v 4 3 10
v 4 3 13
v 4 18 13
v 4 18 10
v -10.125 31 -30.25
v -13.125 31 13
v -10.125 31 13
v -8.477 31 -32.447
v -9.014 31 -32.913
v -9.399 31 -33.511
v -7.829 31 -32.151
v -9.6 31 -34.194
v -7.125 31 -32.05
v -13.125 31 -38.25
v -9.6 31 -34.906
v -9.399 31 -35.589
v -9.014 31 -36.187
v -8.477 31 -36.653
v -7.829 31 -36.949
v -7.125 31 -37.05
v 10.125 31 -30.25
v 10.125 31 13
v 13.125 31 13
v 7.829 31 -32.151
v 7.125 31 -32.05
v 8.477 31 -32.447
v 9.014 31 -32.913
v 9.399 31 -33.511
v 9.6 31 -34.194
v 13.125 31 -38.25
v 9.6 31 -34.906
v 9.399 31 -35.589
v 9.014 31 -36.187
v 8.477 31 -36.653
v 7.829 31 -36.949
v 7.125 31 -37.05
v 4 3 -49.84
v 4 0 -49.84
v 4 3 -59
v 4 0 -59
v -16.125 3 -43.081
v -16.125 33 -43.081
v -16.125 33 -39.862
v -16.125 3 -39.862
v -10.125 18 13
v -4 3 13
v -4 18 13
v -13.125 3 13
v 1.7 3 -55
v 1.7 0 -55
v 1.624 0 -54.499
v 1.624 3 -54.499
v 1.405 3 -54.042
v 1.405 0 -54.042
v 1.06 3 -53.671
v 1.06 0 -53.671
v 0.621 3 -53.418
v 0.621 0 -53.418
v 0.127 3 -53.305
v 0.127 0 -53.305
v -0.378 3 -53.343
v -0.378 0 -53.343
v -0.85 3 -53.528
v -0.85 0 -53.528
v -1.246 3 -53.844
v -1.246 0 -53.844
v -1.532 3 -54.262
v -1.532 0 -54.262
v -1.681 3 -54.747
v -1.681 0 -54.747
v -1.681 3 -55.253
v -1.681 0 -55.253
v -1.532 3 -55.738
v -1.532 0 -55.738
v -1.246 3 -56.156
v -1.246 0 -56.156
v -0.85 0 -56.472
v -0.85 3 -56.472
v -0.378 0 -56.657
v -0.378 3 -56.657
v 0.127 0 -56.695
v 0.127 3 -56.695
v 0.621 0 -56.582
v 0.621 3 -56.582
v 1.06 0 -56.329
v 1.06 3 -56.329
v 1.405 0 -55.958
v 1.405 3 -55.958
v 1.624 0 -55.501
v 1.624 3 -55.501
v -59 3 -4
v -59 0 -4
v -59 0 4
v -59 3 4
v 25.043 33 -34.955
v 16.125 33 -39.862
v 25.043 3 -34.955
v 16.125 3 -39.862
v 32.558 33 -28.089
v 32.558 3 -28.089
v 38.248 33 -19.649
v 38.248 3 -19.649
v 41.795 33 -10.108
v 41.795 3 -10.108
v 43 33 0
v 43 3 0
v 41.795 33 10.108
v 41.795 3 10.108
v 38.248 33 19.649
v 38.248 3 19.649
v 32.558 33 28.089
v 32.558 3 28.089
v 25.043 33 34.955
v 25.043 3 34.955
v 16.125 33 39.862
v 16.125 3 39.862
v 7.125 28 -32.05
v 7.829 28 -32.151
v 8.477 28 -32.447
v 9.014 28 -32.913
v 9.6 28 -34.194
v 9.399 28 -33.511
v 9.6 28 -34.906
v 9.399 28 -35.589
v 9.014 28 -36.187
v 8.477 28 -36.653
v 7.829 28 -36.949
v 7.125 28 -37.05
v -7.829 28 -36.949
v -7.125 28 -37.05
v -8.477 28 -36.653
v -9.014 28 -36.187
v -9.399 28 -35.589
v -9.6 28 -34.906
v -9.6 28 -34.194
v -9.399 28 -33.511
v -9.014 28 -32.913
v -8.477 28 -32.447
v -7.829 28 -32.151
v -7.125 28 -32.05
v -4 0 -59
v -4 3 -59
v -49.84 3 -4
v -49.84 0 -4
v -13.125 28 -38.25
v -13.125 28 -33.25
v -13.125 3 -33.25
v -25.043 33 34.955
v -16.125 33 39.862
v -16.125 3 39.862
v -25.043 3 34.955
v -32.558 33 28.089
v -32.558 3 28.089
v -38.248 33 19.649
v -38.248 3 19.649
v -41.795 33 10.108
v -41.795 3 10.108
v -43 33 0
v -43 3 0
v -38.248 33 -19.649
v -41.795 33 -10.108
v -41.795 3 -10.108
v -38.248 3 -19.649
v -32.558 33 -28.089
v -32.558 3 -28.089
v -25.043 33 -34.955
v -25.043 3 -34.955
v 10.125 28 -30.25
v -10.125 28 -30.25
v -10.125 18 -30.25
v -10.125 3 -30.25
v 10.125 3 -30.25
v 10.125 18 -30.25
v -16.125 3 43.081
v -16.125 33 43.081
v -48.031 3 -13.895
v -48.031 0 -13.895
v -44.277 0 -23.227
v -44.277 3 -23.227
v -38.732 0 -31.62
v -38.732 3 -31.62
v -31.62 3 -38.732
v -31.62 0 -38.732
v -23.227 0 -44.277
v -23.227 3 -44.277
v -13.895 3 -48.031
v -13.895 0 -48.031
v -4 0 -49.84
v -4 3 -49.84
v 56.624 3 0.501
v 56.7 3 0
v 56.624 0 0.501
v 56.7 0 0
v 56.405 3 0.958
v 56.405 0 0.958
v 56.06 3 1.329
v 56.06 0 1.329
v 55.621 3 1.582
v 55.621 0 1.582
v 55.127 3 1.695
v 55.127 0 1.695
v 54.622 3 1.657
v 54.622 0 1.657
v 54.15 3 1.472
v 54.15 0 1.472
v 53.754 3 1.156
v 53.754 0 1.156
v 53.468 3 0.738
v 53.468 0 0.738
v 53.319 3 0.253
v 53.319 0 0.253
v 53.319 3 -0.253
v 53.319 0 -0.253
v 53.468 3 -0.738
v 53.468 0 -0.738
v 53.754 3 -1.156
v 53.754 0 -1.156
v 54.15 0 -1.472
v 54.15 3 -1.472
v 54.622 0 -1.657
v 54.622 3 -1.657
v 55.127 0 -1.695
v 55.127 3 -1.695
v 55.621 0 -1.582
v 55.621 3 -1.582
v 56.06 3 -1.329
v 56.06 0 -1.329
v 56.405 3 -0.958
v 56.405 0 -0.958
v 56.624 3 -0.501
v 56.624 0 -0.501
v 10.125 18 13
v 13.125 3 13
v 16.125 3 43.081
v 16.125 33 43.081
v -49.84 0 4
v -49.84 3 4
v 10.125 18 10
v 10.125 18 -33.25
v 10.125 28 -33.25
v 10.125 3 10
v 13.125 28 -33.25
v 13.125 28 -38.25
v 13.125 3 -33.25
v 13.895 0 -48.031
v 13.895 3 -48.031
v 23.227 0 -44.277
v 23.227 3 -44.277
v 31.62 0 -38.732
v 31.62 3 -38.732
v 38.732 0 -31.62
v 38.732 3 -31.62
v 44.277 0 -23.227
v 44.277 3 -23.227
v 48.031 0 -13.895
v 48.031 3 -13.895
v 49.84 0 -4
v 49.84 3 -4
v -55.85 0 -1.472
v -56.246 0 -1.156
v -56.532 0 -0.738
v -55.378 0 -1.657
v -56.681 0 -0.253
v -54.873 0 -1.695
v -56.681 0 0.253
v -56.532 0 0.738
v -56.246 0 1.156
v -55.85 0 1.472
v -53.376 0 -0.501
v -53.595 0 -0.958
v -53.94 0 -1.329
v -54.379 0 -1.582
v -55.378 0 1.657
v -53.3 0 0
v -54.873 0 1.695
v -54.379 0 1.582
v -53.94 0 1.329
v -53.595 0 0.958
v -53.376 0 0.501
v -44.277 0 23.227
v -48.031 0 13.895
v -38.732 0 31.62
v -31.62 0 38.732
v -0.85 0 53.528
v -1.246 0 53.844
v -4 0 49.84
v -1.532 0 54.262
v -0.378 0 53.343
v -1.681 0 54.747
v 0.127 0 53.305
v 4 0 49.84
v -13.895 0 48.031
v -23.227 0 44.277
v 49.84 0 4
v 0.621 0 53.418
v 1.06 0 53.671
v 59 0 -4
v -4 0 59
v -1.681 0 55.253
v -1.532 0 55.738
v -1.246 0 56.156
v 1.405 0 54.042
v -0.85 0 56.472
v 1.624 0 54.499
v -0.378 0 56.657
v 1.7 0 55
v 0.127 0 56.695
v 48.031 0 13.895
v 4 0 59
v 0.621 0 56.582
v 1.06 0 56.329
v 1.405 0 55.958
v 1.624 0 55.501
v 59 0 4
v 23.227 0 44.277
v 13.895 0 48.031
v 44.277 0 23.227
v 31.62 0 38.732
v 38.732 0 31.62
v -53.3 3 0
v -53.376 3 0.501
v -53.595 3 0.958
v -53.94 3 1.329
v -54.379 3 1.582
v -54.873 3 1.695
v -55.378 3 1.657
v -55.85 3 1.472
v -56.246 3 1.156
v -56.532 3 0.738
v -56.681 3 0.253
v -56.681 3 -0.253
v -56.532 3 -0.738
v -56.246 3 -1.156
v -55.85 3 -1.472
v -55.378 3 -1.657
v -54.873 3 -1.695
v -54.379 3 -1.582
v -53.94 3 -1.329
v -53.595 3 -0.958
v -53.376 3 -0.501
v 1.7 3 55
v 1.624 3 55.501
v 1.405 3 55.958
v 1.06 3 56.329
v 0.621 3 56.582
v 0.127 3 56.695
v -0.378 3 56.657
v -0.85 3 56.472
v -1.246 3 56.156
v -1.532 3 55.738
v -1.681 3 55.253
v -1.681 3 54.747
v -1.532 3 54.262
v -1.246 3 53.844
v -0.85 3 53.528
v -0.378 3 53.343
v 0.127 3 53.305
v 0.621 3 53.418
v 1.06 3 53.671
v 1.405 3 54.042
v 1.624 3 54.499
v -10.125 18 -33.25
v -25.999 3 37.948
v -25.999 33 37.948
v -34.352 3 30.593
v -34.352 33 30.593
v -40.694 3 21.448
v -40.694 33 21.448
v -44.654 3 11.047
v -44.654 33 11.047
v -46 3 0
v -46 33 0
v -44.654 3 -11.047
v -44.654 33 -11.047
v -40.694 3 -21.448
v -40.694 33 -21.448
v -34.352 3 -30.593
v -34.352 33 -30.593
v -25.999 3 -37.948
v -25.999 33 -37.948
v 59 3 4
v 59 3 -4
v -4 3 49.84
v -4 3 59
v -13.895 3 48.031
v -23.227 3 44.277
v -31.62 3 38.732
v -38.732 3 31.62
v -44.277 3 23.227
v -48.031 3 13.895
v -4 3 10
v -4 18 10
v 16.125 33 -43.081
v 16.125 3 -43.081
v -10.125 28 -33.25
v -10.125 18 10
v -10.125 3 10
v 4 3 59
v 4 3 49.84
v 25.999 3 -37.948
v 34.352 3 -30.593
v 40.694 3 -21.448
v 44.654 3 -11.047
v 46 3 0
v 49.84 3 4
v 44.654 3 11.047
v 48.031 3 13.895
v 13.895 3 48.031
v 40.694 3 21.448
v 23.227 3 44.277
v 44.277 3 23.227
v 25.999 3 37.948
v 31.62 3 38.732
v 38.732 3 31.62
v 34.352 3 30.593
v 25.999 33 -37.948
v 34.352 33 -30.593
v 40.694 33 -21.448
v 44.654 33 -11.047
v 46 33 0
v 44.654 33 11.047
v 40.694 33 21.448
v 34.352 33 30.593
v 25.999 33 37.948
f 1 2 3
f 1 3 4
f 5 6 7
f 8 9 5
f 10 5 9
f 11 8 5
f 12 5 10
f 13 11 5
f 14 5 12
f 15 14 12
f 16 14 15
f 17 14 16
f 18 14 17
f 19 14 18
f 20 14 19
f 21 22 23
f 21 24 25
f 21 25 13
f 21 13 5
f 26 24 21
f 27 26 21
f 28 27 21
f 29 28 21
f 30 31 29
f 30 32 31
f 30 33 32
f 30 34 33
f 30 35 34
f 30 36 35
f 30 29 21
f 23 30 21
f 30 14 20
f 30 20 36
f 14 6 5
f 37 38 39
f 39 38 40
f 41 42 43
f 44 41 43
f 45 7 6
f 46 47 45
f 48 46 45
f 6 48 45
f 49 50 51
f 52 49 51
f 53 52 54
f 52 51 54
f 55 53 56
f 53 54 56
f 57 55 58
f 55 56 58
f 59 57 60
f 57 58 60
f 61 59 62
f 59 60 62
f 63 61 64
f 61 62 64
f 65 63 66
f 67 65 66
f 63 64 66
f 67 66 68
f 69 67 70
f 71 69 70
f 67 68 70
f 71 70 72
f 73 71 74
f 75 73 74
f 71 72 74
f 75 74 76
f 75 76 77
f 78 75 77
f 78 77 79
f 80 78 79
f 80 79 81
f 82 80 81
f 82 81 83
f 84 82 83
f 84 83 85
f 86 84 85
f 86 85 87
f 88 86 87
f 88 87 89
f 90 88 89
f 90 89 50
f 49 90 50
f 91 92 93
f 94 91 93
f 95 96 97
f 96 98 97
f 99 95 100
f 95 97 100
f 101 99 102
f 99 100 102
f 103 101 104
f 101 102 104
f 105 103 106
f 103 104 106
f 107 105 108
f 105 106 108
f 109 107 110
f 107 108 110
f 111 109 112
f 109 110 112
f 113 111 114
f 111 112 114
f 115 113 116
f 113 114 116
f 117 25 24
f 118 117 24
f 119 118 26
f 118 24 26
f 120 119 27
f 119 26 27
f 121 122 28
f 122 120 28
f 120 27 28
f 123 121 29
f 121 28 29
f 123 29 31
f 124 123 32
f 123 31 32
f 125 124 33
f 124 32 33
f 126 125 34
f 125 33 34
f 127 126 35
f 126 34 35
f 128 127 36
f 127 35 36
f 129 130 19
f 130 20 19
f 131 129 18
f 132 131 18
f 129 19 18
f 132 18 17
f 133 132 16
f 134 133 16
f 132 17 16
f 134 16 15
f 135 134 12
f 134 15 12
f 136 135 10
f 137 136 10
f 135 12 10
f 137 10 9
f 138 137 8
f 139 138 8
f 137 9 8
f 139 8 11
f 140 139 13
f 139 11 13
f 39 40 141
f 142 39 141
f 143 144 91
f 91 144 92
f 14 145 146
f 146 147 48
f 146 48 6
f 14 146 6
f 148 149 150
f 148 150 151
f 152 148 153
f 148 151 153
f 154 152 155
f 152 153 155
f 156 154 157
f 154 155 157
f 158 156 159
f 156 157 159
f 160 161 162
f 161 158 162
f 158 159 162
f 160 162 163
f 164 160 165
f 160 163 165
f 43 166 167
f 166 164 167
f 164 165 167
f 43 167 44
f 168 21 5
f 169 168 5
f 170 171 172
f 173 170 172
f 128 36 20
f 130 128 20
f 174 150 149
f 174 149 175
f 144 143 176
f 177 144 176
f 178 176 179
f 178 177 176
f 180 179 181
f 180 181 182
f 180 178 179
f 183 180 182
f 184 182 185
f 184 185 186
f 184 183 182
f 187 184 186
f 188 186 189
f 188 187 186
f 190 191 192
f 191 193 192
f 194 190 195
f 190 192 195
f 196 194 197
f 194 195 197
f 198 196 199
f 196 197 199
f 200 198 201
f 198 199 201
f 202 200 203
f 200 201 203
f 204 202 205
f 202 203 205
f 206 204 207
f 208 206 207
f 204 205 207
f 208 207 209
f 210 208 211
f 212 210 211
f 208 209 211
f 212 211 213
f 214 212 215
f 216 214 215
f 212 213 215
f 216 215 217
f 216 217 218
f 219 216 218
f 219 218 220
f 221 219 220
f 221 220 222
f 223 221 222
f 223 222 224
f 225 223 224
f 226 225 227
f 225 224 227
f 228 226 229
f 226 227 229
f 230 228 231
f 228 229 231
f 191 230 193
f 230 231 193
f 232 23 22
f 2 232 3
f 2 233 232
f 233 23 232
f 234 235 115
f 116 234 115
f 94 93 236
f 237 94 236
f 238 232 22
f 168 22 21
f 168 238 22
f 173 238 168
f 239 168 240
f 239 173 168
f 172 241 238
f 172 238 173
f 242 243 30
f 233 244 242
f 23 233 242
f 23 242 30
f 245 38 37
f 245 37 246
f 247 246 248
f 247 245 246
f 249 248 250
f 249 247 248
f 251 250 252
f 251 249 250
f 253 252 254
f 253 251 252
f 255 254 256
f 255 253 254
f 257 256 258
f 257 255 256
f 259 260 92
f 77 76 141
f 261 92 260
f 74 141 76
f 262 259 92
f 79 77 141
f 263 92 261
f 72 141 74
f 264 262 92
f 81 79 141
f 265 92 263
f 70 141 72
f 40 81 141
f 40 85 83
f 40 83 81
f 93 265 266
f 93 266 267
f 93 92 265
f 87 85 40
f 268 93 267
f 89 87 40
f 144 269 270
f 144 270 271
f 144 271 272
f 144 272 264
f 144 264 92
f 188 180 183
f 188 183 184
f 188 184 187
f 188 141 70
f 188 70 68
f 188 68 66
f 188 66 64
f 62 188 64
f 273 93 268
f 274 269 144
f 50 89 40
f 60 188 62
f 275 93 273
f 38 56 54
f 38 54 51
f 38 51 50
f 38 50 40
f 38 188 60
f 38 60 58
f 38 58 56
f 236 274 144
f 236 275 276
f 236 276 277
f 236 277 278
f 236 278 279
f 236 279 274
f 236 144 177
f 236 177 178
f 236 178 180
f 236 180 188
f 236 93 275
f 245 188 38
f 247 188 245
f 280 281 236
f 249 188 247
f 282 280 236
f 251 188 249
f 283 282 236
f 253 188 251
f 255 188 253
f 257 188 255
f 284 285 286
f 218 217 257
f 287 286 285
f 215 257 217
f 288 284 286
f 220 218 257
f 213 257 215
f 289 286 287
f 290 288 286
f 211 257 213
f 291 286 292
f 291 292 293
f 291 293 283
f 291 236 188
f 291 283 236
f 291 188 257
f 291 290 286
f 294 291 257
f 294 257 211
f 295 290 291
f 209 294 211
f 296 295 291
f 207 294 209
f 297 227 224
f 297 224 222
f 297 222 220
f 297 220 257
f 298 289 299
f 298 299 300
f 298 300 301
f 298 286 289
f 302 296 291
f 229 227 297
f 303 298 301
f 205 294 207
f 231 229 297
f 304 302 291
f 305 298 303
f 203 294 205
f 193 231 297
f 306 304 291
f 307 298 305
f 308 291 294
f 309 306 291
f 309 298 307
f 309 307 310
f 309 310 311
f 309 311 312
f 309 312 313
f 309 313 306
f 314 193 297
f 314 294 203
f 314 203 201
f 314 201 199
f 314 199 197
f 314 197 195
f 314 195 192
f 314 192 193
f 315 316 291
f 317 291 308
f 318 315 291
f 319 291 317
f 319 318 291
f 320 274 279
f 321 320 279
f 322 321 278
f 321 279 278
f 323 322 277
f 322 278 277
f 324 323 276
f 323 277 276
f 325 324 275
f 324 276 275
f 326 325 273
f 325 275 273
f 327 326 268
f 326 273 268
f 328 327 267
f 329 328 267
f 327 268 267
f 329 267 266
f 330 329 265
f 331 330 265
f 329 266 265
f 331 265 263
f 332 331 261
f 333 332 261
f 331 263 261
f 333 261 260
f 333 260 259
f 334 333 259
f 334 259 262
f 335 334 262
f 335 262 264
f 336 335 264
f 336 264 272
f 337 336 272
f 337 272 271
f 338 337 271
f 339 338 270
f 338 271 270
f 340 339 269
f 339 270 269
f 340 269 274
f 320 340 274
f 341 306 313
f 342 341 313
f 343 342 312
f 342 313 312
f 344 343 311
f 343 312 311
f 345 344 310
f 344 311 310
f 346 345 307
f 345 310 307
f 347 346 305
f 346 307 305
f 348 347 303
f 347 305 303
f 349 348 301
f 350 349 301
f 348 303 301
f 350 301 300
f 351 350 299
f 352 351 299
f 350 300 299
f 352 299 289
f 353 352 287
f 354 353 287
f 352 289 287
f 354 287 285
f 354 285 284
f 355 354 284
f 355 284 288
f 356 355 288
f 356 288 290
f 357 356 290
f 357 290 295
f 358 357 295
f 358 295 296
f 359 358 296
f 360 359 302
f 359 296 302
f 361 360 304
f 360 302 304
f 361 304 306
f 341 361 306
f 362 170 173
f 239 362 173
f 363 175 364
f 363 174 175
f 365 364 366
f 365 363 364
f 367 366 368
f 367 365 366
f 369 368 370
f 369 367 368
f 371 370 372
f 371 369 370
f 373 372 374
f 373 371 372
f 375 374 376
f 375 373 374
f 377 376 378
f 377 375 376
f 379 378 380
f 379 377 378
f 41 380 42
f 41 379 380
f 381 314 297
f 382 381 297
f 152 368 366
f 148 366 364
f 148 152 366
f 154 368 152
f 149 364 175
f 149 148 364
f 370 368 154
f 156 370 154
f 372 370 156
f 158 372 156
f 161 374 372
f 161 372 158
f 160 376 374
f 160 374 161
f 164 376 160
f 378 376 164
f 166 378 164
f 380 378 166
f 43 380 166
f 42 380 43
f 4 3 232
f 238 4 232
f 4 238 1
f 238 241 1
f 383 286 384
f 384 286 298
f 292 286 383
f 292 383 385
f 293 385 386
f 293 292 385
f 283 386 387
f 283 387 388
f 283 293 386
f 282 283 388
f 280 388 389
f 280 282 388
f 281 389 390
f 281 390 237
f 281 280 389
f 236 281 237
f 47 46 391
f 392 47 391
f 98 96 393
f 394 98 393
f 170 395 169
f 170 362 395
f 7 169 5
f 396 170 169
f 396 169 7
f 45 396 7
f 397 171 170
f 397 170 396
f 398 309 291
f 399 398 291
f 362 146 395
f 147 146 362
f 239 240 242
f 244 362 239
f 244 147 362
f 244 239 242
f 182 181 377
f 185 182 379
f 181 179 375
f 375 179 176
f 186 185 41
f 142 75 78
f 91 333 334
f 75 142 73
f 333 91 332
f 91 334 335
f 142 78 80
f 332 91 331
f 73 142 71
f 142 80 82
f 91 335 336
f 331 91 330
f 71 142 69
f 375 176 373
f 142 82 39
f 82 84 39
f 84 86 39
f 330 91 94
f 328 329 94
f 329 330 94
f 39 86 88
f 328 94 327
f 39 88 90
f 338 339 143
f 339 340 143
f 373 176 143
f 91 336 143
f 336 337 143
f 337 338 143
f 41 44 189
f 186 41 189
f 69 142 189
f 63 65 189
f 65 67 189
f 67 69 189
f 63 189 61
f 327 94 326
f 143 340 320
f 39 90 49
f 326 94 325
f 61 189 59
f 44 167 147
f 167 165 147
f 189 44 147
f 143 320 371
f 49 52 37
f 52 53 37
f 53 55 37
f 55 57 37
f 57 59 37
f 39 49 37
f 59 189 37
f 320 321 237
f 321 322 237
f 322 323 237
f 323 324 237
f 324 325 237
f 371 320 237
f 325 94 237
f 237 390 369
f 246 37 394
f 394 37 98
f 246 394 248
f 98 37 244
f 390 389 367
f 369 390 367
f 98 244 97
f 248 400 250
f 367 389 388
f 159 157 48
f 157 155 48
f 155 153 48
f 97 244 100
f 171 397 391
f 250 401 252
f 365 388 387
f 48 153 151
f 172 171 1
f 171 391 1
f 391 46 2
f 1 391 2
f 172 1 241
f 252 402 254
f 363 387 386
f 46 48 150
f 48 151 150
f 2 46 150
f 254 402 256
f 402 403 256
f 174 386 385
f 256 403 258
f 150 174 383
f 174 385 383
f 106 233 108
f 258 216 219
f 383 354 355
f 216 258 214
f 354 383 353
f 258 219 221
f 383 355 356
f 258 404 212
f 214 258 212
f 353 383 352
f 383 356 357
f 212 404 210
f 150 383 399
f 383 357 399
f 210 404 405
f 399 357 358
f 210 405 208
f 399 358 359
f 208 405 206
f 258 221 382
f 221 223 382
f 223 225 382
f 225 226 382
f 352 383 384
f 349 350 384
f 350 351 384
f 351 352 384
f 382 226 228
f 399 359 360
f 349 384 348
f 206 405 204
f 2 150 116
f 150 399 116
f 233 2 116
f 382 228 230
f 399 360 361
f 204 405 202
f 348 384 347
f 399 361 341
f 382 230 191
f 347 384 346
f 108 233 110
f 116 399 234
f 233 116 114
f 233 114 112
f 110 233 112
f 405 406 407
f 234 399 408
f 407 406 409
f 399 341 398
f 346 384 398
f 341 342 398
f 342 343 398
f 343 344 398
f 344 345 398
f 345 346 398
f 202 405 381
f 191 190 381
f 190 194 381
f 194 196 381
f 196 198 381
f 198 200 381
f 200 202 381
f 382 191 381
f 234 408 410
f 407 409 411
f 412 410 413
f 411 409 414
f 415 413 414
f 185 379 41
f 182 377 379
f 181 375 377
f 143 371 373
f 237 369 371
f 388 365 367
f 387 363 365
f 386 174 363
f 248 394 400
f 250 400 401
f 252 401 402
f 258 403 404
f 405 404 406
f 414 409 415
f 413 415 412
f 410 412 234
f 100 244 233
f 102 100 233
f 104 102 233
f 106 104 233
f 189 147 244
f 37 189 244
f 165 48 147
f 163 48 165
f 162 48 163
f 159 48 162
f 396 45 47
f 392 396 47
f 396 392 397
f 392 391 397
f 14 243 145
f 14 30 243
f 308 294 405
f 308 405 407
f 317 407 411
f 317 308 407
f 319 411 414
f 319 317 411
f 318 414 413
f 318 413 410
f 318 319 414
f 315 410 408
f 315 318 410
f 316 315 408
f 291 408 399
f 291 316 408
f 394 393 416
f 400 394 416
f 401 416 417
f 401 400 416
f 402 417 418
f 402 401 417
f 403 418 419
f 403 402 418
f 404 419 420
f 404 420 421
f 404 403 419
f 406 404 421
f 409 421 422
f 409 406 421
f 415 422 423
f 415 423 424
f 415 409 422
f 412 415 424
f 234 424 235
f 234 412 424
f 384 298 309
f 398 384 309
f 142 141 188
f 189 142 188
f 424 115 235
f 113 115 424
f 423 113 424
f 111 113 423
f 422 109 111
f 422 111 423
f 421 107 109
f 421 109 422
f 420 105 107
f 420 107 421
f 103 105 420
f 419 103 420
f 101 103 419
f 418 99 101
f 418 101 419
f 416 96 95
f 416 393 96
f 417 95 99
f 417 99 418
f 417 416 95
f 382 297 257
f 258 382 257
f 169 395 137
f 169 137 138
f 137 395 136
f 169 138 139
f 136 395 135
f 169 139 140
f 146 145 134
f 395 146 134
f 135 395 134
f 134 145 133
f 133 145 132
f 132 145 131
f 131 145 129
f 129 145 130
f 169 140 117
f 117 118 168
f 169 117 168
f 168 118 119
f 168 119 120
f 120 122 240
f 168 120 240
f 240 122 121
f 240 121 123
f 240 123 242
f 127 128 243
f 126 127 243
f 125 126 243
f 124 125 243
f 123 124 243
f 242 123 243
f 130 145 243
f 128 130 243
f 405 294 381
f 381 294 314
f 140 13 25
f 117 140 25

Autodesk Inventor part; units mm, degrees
ref_plane "YZ Plane" through (0, 0, 0) normal (1, 0, 0) x (0, 1, 0)
ref_plane "XZ Plane" through (0, 0, 0) normal (0, 1, 0) x (-1, 0, 0)
ref_plane "XY Plane" through (0, 0, 0) normal (0, 0, 1) x (1, 0, 0)
sketch "Sketch1" plane through (0, 0, 0) normal (0, 1, 0) x (-1, 0, 0)
  circle A0 centre (0, 0) radius 70.5
  circle A1 centre (0, 0) radius 75.5
  dimension "d0" = 141
  dimension "d4" = 5
extrude "Extrusion1" add sketch "Sketch1" along normal blind 50
sketch "Sketch2" plane through (0, 0, 0) normal (0, -1, 0) x (1, 0, 0)
  line L0 (-10.125, 10) -> (10.125, 10)
  line L1 (10.125, 10) -> (10.125, -30.25)
  line L2 (10.125, -30.25) -> (-10.125, -30.25)
  line L3 (-10.125, -30.25) -> (-10.125, 10)
  point P0 (0, 0)
  point P1 (0, 10)
  dimension "d5" = 20.25
  dimension "d6" = 40.25
  dimension "d7" = 10
  dimension "d8" = 10.125
  dimension "d9" = 10.125
extrude "Extrusion2" add sketch "Sketch2" against normal blind 3
sketch "Sketch3" plane through (0, 0, 0) normal (0, -1, 0) x (1, 0, 0)
  line L0 (13.125, 13) -> (10.125, 13)
  line L1 (10.125, 13) -> (10.125, -33.25)
  line L2 (10.125, -33.25) -> (13.125, -33.25)
  line L3 (13.125, -33.25) -> (13.125, 13)
  line L4 (10.125, -33.25) -> (-13.125, -33.25)
  line L5 (-13.125, -33.25) -> (-13.125, -30.25)
  line L6 (-13.125, -30.25) -> (10.125, -30.25)
  line L7 (10.125, -30.25) -> (10.125, -33.25)
  line L8 (-13.125, -30.25) -> (-10.125, -30.25)
  line L9 (-10.125, -30.25) -> (-10.125, 13)
  line L10 (-10.125, 13) -> (-13.125, 13)
  line L11 (-13.125, 13) -> (-13.125, -30.25)
  line L12 (-10.125, -30.25) -> (10.125, -30.25) projected
  line L13 (10.125, -30.25) -> (10.125, 10) projected
  line L14 (-10.125, 10) -> (-10.125, -30.25) projected
  line L15 (10.125, 10) -> (-10.125, 10) projected
  line L16 (10.125, 13) -> (4, 13)
  line L17 (4, 13) -> (4, 10)
  line L18 (4, 10) -> (10.125, 10)
  line L19 (10.125, 10) -> (10.125, 13)
  line L20 (-10.125, 13) -> (-4, 13)
  line L21 (-4, 13) -> (-4, 10)
  line L22 (-4, 10) -> (-10.125, 10)
  line L23 (-10.125, 10) -> (-10.125, 13)
  point P0 (0, 0)
  point P1 (-11.625, 13)
  point P2 (10.125, 11.5)
  dimension "d12" = 3
  dimension "d13" = 3
  dimension "d14" = 3
  dimension "d15" = 0
  dimension "d16" = 0
  dimension "d17" = 0
  dimension "d18" = 3
  dimension "d19" = 3
  dimension "d20" = 6.125
  dimension "d21" = 6.125
extrude "Extrusion3" add sketch "Sketch3" against normal blind 18 contours L3 L2 L1 L0 | L1 L15 L17 L16 | L4 L5 L6 L1 | L6 L11 L10 L9 | L15 L9 L20 L21
sketch "Sketch4" plane through (0, 18, 0) normal (0, 1, 0) x (1, 0, 0)
  line L0 (-4, -13) -> (-13.125, -13) projected
  line L1 (-13.125, 33.25) -> (13.125, 33.25) projected
  line L2 (-13.125, -13) -> (-10.125, -13)
  line L3 (-10.125, -13) -> (-10.125, 33.25)
  line L4 (-10.125, 33.25) -> (-13.125, 33.25)
  line L5 (-13.125, 33.25) -> (-13.125, -13)
  line L6 (13.125, -13) -> (13.125, 33.25) projected
  line L7 (13.125, 33.25) -> (10.125, 33.25)
  line L8 (10.125, 33.25) -> (10.125, -13)
  line L9 (10.125, -13) -> (13.125, -13)
  line L10 (13.125, -13) -> (13.125, 33.25)
  line L11 (-10.125, -10) -> (-10.125, 30.25) projected
  point P0 (0, 0)
  dimension "d24" = 0
extrude "Extrusion4" add sketch "Sketch4" along normal blind 13
sketch "Sketch5" plane through (13.125, 0, -33.25) normal (0, 0, -1) x (-1, 0, 0)
  line L0 (23.25, 31) -> (26.25, 31) projected
  line L1 (0, 0) -> (0, 31) projected
  line L2 (26.25, 31) -> (0, 31)
  line L3 (0, 31) -> (0, 28)
  line L4 (0, 28) -> (26.25, 28)
  line L5 (26.25, 28) -> (26.25, 31)
  point P0 (13.125, 0)
  dimension "d27" = 3
extrude "Extrusion5" add sketch "Sketch5" along normal blind 5
sketch "Sketch6" plane through (0, 31, 0) normal (0, 1, 0) x (1, 0, 0)
  line L0 (10.125, 33.25) -> (-10.125, 33.25) projected
  line L1 (-10.125, 33.25) -> (10.125, 33.25)
  line L2 (10.125, 33.25) -> (10.125, 30.25)
  line L3 (10.125, 30.25) -> (-10.125, 30.25)
  line L4 (-10.125, 30.25) -> (-10.125, 33.25)
  point P0 (0, 0)
extrude "Extrusion6" add sketch "Sketch6" against normal blind 3
sketch "Sketch7" plane through (0, 31, 0) normal (0, 1, 0) x (1, 0, 0)
  circle A0 centre (-7.125, 34.55) radius 2.5
  circle A1 centre (7.125, 34.55) radius 2.5
  line L0 (-10.125, 30.25) -> (10.125, 30.25) projected
  line L1 (-13.125, -13) -> (-13.125, 38.25) projected
  line L2 (13.125, -13) -> (13.125, 38.25) projected
  line L3 (-7.125, 32.05) -> (7.125, 32.05)
  line L4 (7.125, 37.05) -> (-7.125, 37.05)
  point P0 (0, 0)
  dimension "d32" = 4.3
  dimension "d33" = 0
  dimension "d34" = 5
  dimension "d35" = 5
  dimension "d36" = 6
  dimension "d37" = 6
extrude "Extrusion7" cut sketch "Sketch7" against normal blind 3
sketch "Sketch8" plane through (0, 0, 0) normal (0, -1, 0) x (1, 0, 0)
  line L0 (72.6444, -3) -> (-73.2822, -3)
  line L1 (-73.2822, -3) -> (-73.2822, 3)
  line L2 (-73.2822, 3) -> (72.6444, 3)
  line L3 (72.6444, 3) -> (72.6444, -3)
  line L4 (3, -73.2385) -> (-3, -73.2385)
  line L5 (-3, -73.2385) -> (-3, 72.5895)
  line L6 (-3, 72.5895) -> (3, 72.5895)
  line L7 (3, 72.5895) -> (3, -73.2385)
  point P0 (0, 0)
  point P1 (-0.3189, -3)
  point P2 (3, -3)
  point P3 (3, 3)
  point P4 (-3, 3)
  point P5 (-3, -3)
  dimension "d40" = 3
  dimension "d41" = 3
  dimension "d42" = 3
  dimension "d43" = 3
extrude "Extrusion8" add sketch "Sketch8" against normal blind 3
sketch "Sketch9" plane through (0, 50, 0) normal (0, 1, 0) x (1, 0, 0)
  arc A0 (-3, 70.4361) -> (-70.4361, 3) centre (0, 0) ccw projected
  line L0 (-15, 68.8858) -> (15, 68.8858)
  circle A1 centre (0, 0) radius 70.5 projected
  line L1 (-68.8858, -15) -> (-68.8858, 15)
  line L2 (15, -68.8858) -> (-15, -68.8858)
  line L3 (68.8858, 15) -> (68.8858, -15)
  dimension "d46" = 30
  dimension "d49" = 360
extrude "Extrusion9" add sketch "Sketch9" against normal blind 50 contours A1 L0 A0 | L1 A1 A0 | A1 L3 | L2 A1
sketch "Sketch10" plane through (-68.8858, 50, 15) normal (1, 0, 0) x (0, 0, -1)
  circle A0 centre (15, -12) radius 5
  line L0 (45.25, -47) -> (5, -47) projected
  line L1 (0, -50) -> (0, 0) projected
  point P0 (15, -50)
  dimension "d53" = 10
  dimension "d54" = 35
  dimension "d55" = 15
sketch "Sketch11" plane through (0, 3, 0) normal (0, 1, 0) x (1, 0, 0)
  point P0 (0, 0)
extrude "Extrusion10" add sketch "Sketch10" along normal blind 2
sketch "Sketch12" plane through (-66.8858, 38, 0) normal (1, 0, 0) x (0, 0, -1)
  circle A0 centre (0, 0) radius 3.97
  point P0 (0, -38)
  dimension "d58" = 7.94
extrude "Extrusion11" add sketch "Sketch12" along normal blind 11
sketch "Sketch13" plane through (-15, 50, -68.8858) normal (0, 0, 1) x (1, 0, 0)
  circle A0 centre (15, -12) radius 5
  line L0 (25.125, -47) -> (4.875, -47) projected
  point P0 (15, -50)
  dimension "d61" = 10
  dimension "d62" = 35
extrude "Extrusion12" add sketch "Sketch13" along normal blind 2
sketch "Sketch14" plane through (0, 38, -66.8858) normal (0, 0, 1) x (1, 0, 0)
  circle A0 centre (0, 0) radius 5 projected
  circle A1 centre (0, 0) radius 3.97
  point P0 (0, -38)
  dimension "d65" = 7.94
extrude "Extrusion13" add sketch "Sketch14" along normal blind 11 contours A1
sketch "Sketch15" plane through (68.8858, 50, -15) normal (-1, 0, 0) x (0, 0, 1)
  circle A0 centre (15, -12) radius 5
  line L0 (25, -47) -> (-15.25, -47) projected
  point P0 (15, -50)
  dimension "d68" = 10
  dimension "d69" = 35
extrude "Extrusion14" add sketch "Sketch15" along normal blind 2
sketch "Sketch16" plane through (66.8858, 38, 0) normal (-1, 0, 0) x (0, 0, 1)
  circle A0 centre (0, 0) radius 3.97
  point P0 (0, -38)
  dimension "d72" = 7.94
extrude "Extrusion15" add sketch "Sketch16" along normal blind 11
sketch "Sketch17" plane through (15, 50, 68.8858) normal (0, 0, -1) x (-1, 0, 0)
  circle A0 centre (15, -12) radius 5
  line L0 (12, -47) -> (11, -47) projected
  point P0 (15, -50)
  point P1 (11.5, -47)
  dimension "d75" = 10
  dimension "d76" = 35
extrude "Extrusion16" add sketch "Sketch17" along normal blind 2
sketch "Sketch18" plane through (0, 38, 66.8858) normal (0, 0, -1) x (-1, 0, 0)
  circle A0 centre (0, 0) radius 5 projected
  circle A1 centre (0, 0) radius 3.97
  point P0 (0, -38)
  dimension "d79" = 7.94
extrude "Extrusion17" add sketch "Sketch18" along normal blind 11 contours A1
sketch "Sketch19" plane through (0, 50, 0) normal (0, 1, 0) x (1, 0, 0)
  circle A0 centre (0, 0) radius 70.5
extrude "Extrusion18" cut sketch "Sketch19" against normal blind 8
sketch "Sketch20" plane through (0, 50, 0) normal (0, 1, 0) x (1, 0, 0)
  circle A0 centre (0, 0) radius 75.5
  circle A1 centre (0, 0) radius 70.5
extrude "Extrusion19" add sketch "Sketch20" along normal blind 10
sketch "Sketch21" plane through (15, 0, 68.8858) normal (0, 0, -1) x (-1, 0, 0)
  line L0 (18, 0) -> (18, 3) projected
  line L1 (18, 3) -> (13, 3)
  line L2 (13, 3) -> (13, 16.2196)
  line L3 (13, 16.2196) -> (18, 16.2196)
  line L4 (18, 16.2196) -> (18, 3)
  point P0 (15, 0)
  dimension "d87" = 5
  dimension "d88" = 13.2196
extrude "Extrusion20" cut sketch "Sketch21" against normal blind 10
sketch "Sketch22" plane through (0, 60, 0) normal (0, 1, 0) x (1, 0, 0)
  circle A0 centre (0, 0) radius 75.5 projected
  line L0 (-59.9939, -45.8364) -> (-80.9066, -64.8839)
  line L1 (-80.9066, -64.8839) -> (-67.4393, -79.67)
  line L2 (-67.4393, -79.67) -> (-45.8364, -59.9939)
  line L3 (-45.8364, -59.9939) -> (-59.9939, -45.8364)
  line L4 (-66.8858, -5) -> (-66.8858, 5) projected
  line L5 (64.8839, -80.9066) -> (79.67, -67.4393)
  line L6 (79.67, -67.4393) -> (59.9939, -45.8364)
  line L7 (45.8364, -59.9939) -> (64.8839, -80.9066)
  line L8 (59.9939, -45.8364) -> (45.8364, -59.9939)
  line L9 (80.9066, 64.8839) -> (67.4393, 79.67)
  line L10 (67.4393, 79.67) -> (45.8364, 59.9939)
  line L11 (59.9939, 45.8364) -> (80.9066, 64.8839)
  line L12 (45.8364, 59.9939) -> (59.9939, 45.8364)
  line L13 (-64.8839, 80.9066) -> (-79.67, 67.4393)
  line L14 (-79.67, 67.4393) -> (-59.9939, 45.8364)
  line L15 (-45.8364, 59.9939) -> (-64.8839, 80.9066)
  line L16 (-59.9939, 45.8364) -> (-45.8364, 59.9939)
  point P0 (-52.9152, -52.9152)
  point P1 (52.9152, -52.9152)
  point P2 (52.9152, 52.9152)
  point P3 (-52.9152, 52.9152)
  dimension "d91" = 45
  dimension "d92" = 20
  dimension "d93" = 52.9152
  dimension "d96" = 360
extrude "Extrusion21" add sketch "Sketch22" against normal blind 60 contours A0 L10 L9 L11 | L6 L5 L7 A0 | A0 L8 | A0 L14 L13 L15 | L2 L1 L0 A0
sketch "Sketch23" plane through (0, 60, 0) normal (0, 1, 0) x (1, 0, 0)
  arc A0 (-45.8364, -59.9939) -> (45.8364, -59.9939) centre (0, 0) ccw projected
  circle A1 centre (0, 0) radius 75.5
  line L0 (48.1887, -58.1214) -> (67.1018, -78.8865)
  line L1 (64.8839, -80.9066) -> (79.67, -67.4393) projected
  line L2 (78.1665, -70.2437) -> (58.101, -48.2133)
  line L3 (79.67, -67.4393) -> (59.9939, -45.8364) projected
  line L4 (45.8364, -59.9939) -> (64.8839, -80.9066) projected
  line L5 (67.1018, -78.8865) -> (61.0649, -93.7796)
  line L6 (61.0649, -93.7796) -> (42.6475, -67.861)
  line L7 (42.6475, -67.861) -> (45.8364, -59.9939)
  line L8 (67.1018, -78.8865) -> (77.4521, -69.4594)
  line L9 (58.1214, 48.1887) -> (78.8865, 67.1018)
  line L10 (70.2437, 78.1665) -> (48.2133, 58.101)
  line L11 (78.8865, 67.1018) -> (69.4594, 77.4521)
  circle A2 centre (0, 0) radius 75.5
  line L12 (-48.1887, 58.1214) -> (-67.1018, 78.8865)
  line L13 (-78.1665, 70.2437) -> (-58.101, 48.2133)
  line L14 (-67.1018, 78.8865) -> (-77.4521, 69.4594)
  circle A3 centre (0, 0) radius 75.5
  line L15 (-58.1214, -48.1887) -> (-78.8865, -67.1018)
  line L16 (-70.2437, -78.1665) -> (-48.2133, -58.101)
  line L17 (-78.8865, -67.1018) -> (-69.4594, -77.4521)
  circle A4 centre (0, 0) radius 75.5
  point P0 (45.8364, 59.9939)
  point P1 (-59.9939, 45.8364)
  point P2 (-45.8364, -59.9939)
  dimension "d100" = 3
  dimension "d101" = 3
  dimension "d102" = 151
  dimension "d105" = 360
extrude "Extrusion22" cut sketch "Sketch23" against normal blind 57 contours L16 L17 L15 A1 | A1 L2 L1 L0 | L13 L14 L12 A1 | L10 L11 L9 A1
sketch "Sketch24" plane through (59.9939, 0, -45.8364) normal (0.673368, 0, 0.7393075) x (0.7393075, 0, -0.673368)
  line L0 (0, 60) -> (-61.7295, 60) projected
  line L1 (28.2869, 0) -> (0, 0) projected
  line L2 (0, 60) -> (28.2869, 0)
  arc A0 (28.2869, 0) -> (0, 60) centre (28.2869, 36.6679) ccw
  point P0 (-75.2187, 0)
extrude "Extrusion23" cut sketch "Sketch24" against normal blind 57
sketch "Sketch25" plane through (-45.8364, 0, -59.9939) normal (0.7393075, 0, -0.673368) x (-0.673368, 0, -0.7393075)
  line L0 (0.2813, 60) -> (-0.4509, 60) projected
  line L1 (-0.9335, 0) -> (28.2869, 0) projected
  line L2 (-0.4509, 60) -> (28.2869, 0)
  arc A0 (28.2869, 0) -> (-0.4509, 60) centre (28.2869, 36.8822) ccw
  point P0 (-75.2187, 0)
  point P1 (0.1996, 60)
extrude "Extrusion24" cut sketch "Sketch25" against normal blind 57
sketch "Sketch26" plane through (-59.9939, 0, 45.8364) normal (-0.673368, 0, -0.7393075) x (-0.7393075, 0, 0.673368)
  line L0 (0, 0) -> (-61.7295, 0) projected
  line L1 (-0.9335, 0) -> (28.2869, 0) projected
  line L2 (0, 0) -> (28.2869, 0)
  arc A0 (28.2869, 0) -> (0, 67.3564) centre (28.2869, 39.6179) ccw
  line L3 (0, 67.3564) -> (0, 59.5281)
  line L4 (28.2869, 60) -> (28.2869, 0) projected
  line L5 (0, 59.5281) -> (28.2869, 0)
  point P0 (-75.2187, 0)
extrude "Extrusion25" cut sketch "Sketch26" against normal blind 57
sketch "Sketch27" plane through (45.8364, 0, 59.9939) normal (-0.7393075, 0, 0.673368) x (0.673368, 0, 0.7393075)
  line L0 (0, 0) -> (0, 60) projected
  line L1 (28.2869, 0) -> (0, 0) projected
  line L2 (0, 60) -> (28.2869, 0)
  arc A0 (28.2869, 0) -> (0, 60) centre (28.2869, 36.6679) ccw
  point P0 (-75.2187, 0)
extrude "Extrusion26" cut sketch "Sketch27" against normal blind 57 contours A0 L2
sketch "Sketch28" plane through (0, 3, 0) normal (0, 1, 0) x (1, 0, 0)
  circle A0 centre (67.6211, -69.0611) radius 2.5
  line L0 (66.1494, -77.8409) -> (76.4997, -68.4138) projected
  line L1 (76.4997, -68.4138) -> (58.4046, -48.5467) projected
  line L2 (48.1887, -58.1214) -> (66.1494, -77.8409) projected
  circle A1 centre (69.0611, 67.6211) radius 2.5
  circle A2 centre (-67.6211, 69.0611) radius 2.5
  circle A3 centre (-69.0611, -67.6211) radius 2.5
  point P0 (0, 0)
  dimension "d117" = 5
  dimension "d118" = 5.5
  dimension "d119" = 7
  dimension "d120" = 7
  dimension "d123" = 360
extrude "Extrusion27" cut sketch "Sketch28" against normal blind 57
sketch "Sketch29" plane through (0, 60, 0) normal (0, 1, 0) x (1, 0, 0)
  line L0 (-13.125, -13) -> (-13.125, -3) projected
  line L1 (13.125, -13) -> (13.125, 38.25) projected
  line L2 (-13.125, -13) -> (13.125, -13)
  line L3 (13.125, -13) -> (13.125, 38.25)
  line L4 (13.125, 38.25) -> (-13.125, 38.25)
  line L5 (-13.125, 38.25) -> (-13.125, -13)
  line L6 (-173.1074, 171.3287) -> (429.6424, 171.3287)
  line L7 (429.6424, 171.3287) -> (429.6424, -291.0697)
  line L8 (429.6424, -291.0697) -> (-173.1074, -291.0697)
  line L9 (-173.1074, -291.0697) -> (-173.1074, 171.3287)
  point P0 (0, 0)
  point P1 (-13.125, -3)
extrude "Extrusion28" cut sketch "Sketch29" against normal blind 1111
sketch "Sketch30" plane through (0, 3, 0) normal (0, 1, 0) x (1, 0, 0)
  line L0 (3, 33.25) -> (-3, 33.25) projected
  line L1 (-3, 38.25) -> (-3, 33.25) projected
  line L2 (3, 33.25) -> (-3, 33.25)
  line L3 (-3, 33.25) -> (-3, 38.25)
  line L4 (-3, 38.25) -> (3, 38.25)
  line L5 (3, 38.25) -> (3, 33.25)
  point P0 (0, 0)
extrude "Extrusion29" cut sketch "Sketch30" against normal blind 1111
sketch "Sketch31" plane through (0, 0, 0) normal (0, -1, 0) x (1, 0, 0)
  circle A0 centre (0, 0) radius 50
  dimension "d131" = 100
extrude "Extrusion30" add sketch "Sketch31" against normal blind 3
sketch "Sketch32" plane through (0, 3, 0) normal (0, 1, 0) x (1, 0, 0)
  circle A0 centre (0, 0) radius 46
  circle A1 centre (0, 0) radius 43
  dimension "d134" = 92
  dimension "d135" = 3
extrude "Extrusion31" add sketch "Sketch32" along normal blind 30
sketch "Sketch33" plane through (0, 33, 0) normal (0, 1, 0) x (1, 0, 0)
  line L0 (-16.125, 38.25) -> (16.125, 38.25)
  line L1 (16.125, 38.25) -> (16.125, 55.4979)
  line L2 (16.125, 55.4979) -> (-16.125, 55.4979)
  line L3 (-16.125, 55.4979) -> (-16.125, 38.25)
  line L4 (-13.125, -13) -> (-13.125, 38.25) projected
  line L5 (13.125, -13) -> (13.125, 38.25) projected
  line L6 (-16.125, -53.5102) -> (16.125, -53.5102)
  line L7 (16.125, -53.5102) -> (16.125, -24.6869)
  line L8 (16.125, -24.6869) -> (-16.125, -24.6869)
  line L9 (-16.125, -24.6869) -> (-16.125, -53.5102)
  point P0 (0, 0)
  dimension "d138" = 3
  dimension "d139" = 3
extrude "Extrusion32" cut sketch "Sketch33" against normal blind 30
sketch "Sketch34" plane through (0, 0, 0) normal (0, -1, 0) x (1, 0, 0)
  circle A0 centre (0, 0) radius 50
  line L0 (49.9711, 1.7) -> (55, 1.7)
  line L1 (55, 1.7) -> (55, -1.7)
  line L2 (55, -1.7) -> (49.9711, -1.7)
  circle A1 centre (55, 0) radius 1.7
  line L3 (49.8397, 4) -> (59, 4)
  line L4 (59, 4) -> (59, -4)
  line L5 (59, -4) -> (49.8397, -4)
  circle A2 centre (0, 0) radius 50
  line L6 (-1.7, 49.9711) -> (-1.7, 55)
  line L7 (-1.7, 55) -> (1.7, 55)
  line L8 (1.7, 55) -> (1.7, 49.9711)
  circle A3 centre (0, 55) radius 1.7
  line L9 (-4, 49.8397) -> (-4, 59)
  line L10 (-4, 59) -> (4, 59)
  line L11 (4, 59) -> (4, 49.8397)
  circle A4 centre (0, 0) radius 50
  line L12 (-49.9711, -1.7) -> (-55, -1.7)
  line L13 (-55, -1.7) -> (-55, 1.7)
  line L14 (-55, 1.7) -> (-49.9711, 1.7)
  circle A5 centre (-55, 0) radius 1.7
  line L15 (-49.8397, -4) -> (-59, -4)
  line L16 (-59, -4) -> (-59, 4)
  line L17 (-59, 4) -> (-49.8397, 4)
  circle A6 centre (0, 0) radius 50
  line L18 (1.7, -49.9711) -> (1.7, -55)
  line L19 (1.7, -55) -> (-1.7, -55)
  line L20 (-1.7, -55) -> (-1.7, -49.9711)
  circle A7 centre (0, -55) radius 1.7
  line L21 (4, -49.8397) -> (4, -59)
  line L22 (4, -59) -> (-4, -59)
  line L23 (-4, -59) -> (-4, -49.8397)
  dimension "d142" = 3.4
  dimension "d143" = 100
  dimension "d144" = 55
  dimension "d145" = 0
  dimension "d146" = 4
  dimension "d147" = 4
  dimension "d148" = 4
  dimension "d151" = 360
extrude "Extrusion33" add sketch "Sketch34" against normal blind 3 contours A0 L0 A1 L2 | A0 L3 L4 L5 L2 A1 L0 | A0 L8 A3 L6 L9 L10 L11 | L21 L22 L23 A0 L20 A7 L18 | A0 L6 A3 L8 | L18 A7 L20 A0 | A0 L14 A5 L12 L15 L16 L17 | A0 L12 A5 L14
properties part number "spinny base"
